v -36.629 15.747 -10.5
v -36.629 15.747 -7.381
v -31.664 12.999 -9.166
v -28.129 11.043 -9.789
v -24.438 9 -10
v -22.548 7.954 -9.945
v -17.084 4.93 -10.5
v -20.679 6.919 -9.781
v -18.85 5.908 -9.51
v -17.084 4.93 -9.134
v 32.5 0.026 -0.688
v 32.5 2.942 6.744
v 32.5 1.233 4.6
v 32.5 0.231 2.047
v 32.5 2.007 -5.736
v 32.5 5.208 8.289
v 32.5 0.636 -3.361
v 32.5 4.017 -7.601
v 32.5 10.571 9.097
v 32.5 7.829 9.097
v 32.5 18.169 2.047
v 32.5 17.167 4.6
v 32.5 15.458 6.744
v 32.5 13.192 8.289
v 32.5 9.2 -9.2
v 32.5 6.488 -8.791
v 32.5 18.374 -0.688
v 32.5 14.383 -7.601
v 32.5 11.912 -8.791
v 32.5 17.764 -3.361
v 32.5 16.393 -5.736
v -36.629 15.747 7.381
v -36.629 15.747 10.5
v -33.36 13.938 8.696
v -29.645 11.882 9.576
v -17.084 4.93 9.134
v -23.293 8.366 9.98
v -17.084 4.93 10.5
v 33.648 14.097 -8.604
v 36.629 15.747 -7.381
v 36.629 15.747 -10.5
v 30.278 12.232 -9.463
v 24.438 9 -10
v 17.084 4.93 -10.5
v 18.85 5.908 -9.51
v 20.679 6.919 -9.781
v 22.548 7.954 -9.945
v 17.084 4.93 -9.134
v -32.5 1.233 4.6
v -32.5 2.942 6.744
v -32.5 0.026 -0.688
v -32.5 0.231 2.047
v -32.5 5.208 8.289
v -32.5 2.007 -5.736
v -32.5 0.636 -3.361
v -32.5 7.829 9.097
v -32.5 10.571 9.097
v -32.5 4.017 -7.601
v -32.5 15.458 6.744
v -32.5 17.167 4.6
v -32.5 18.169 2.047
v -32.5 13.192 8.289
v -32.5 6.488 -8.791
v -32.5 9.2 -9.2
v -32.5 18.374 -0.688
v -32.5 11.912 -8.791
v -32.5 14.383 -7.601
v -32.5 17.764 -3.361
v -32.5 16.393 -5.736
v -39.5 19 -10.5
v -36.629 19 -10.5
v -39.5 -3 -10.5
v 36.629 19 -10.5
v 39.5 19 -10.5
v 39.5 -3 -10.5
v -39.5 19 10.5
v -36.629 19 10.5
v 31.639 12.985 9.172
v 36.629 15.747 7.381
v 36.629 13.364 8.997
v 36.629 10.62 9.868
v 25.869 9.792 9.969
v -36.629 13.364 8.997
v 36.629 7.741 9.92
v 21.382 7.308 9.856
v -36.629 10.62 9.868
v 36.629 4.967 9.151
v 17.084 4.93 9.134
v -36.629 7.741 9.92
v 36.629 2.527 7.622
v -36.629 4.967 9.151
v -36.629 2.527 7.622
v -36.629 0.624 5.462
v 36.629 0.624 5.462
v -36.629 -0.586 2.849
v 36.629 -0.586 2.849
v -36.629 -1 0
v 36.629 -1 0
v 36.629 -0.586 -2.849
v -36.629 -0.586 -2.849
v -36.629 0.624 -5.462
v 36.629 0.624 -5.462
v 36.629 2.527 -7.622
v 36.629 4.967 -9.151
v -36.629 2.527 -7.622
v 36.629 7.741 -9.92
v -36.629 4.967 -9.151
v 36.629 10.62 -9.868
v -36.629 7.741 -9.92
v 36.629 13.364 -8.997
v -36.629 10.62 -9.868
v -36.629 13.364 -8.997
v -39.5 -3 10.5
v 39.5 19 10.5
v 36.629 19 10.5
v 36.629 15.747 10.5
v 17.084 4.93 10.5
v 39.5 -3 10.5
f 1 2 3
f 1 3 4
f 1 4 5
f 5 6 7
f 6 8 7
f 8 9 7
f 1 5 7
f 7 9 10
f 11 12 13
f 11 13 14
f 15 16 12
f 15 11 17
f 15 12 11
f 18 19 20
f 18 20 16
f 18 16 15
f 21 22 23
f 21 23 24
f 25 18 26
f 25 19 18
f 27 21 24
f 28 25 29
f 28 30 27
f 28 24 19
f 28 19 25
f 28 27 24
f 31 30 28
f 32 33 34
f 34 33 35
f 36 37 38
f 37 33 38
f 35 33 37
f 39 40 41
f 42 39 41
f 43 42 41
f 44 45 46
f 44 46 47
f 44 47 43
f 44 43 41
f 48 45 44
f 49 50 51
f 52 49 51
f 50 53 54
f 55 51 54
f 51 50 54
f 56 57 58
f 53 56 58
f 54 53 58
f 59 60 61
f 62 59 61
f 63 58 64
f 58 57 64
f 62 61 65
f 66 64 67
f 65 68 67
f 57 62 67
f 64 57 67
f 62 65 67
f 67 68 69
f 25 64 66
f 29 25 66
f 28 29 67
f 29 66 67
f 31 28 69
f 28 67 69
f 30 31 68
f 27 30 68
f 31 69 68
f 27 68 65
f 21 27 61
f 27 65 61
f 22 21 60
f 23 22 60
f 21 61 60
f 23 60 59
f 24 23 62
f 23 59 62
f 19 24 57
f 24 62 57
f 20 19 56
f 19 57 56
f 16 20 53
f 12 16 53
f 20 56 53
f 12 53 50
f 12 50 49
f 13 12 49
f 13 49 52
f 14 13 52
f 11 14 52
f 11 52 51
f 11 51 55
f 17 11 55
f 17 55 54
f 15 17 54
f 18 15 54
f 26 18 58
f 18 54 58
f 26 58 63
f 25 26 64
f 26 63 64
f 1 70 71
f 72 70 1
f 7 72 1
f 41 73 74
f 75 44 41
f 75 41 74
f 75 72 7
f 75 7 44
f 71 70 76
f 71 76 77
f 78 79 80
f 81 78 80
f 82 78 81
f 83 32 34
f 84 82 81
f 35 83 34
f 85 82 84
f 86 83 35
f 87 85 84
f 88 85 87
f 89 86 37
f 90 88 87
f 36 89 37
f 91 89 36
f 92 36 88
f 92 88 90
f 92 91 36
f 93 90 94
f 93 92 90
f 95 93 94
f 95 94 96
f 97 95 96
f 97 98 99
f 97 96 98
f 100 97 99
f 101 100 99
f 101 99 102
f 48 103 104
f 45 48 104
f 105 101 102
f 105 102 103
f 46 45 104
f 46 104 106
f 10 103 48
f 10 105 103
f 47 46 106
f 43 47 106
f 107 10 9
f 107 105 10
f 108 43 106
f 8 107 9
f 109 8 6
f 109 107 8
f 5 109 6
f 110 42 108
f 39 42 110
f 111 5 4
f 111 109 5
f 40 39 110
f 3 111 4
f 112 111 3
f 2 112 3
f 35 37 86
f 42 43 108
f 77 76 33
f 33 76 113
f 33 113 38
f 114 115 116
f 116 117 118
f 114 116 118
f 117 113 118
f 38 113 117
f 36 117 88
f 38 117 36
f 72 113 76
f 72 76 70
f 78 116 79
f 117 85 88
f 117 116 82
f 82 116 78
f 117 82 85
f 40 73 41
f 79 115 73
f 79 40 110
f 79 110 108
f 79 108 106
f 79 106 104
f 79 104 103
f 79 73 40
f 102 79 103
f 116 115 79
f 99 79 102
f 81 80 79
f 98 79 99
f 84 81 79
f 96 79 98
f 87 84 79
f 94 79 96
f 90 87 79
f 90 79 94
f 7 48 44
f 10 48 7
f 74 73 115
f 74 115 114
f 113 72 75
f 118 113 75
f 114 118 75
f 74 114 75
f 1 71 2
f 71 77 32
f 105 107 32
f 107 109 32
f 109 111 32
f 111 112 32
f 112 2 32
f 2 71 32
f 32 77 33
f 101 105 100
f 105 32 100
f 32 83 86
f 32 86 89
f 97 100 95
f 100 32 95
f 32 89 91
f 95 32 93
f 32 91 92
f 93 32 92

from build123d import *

# Parameters (mm, degrees)
BOSS_EXTRUDE3_DEPTH      = 32.5
BOSS_EXTRUDE3_DEPTH_BACK = 32.5
SKETCH8_R                = 9.2
SKETCH9_W                = 79
SKETCH9_H                = 21
BOSS_EXTRUDE4_DEPTH      = 22
CUT_EXTRUDE1_DEPTH       = 49.602983448
CUT_EXTRUDE2_REACH       = 81.164
SKETCH12_R               = 10


with BuildPart() as part:
    # Sketch8 → Boss-Extrude3 (new, two sides: drawn at the far end of the back side and taken through both)
    with BuildSketch(Plane(origin=(0, 0, 0), x_dir=(0, 0, -1), z_dir=(1, 0, 0)).offset(-BOSS_EXTRUDE3_DEPTH_BACK)):
        with Locations((0, 9.2)):
            Circle(SKETCH8_R)
    extrude(amount=BOSS_EXTRUDE3_DEPTH + BOSS_EXTRUDE3_DEPTH_BACK)


with BuildPart() as body_2:
    # Sketch9 → Boss-Extrude4 (new body)
    with BuildSketch(Plane(origin=(0, -3, 0), x_dir=(1, 0, 0), z_dir=(0, 1, 0))):
        Rectangle(SKETCH9_W, SKETCH9_H)
    extrude(amount=BOSS_EXTRUDE4_DEPTH)

    # Sketch11 → Cut-Extrude1 (cut, through all)
    with BuildSketch(Plane.XY.offset(10.5)):
        Polygon((-36.62898703, 19), (-36.62898703, 15.746848223), (-17.083580509, 4.929733927), (0, 4.929733927), (0, 19), align=None)
    cut_extrude1 = extrude(amount=-CUT_EXTRUDE1_DEPTH, mode=Mode.SUBTRACT)

    # Mirror1: Cut-Extrude1 across plane
    add(cut_extrude1.mirror(Plane(origin=(0, 0, 0), x_dir=(0, 0, 1), z_dir=(1, 0, 0))), mode=Mode.SUBTRACT)

    # Cut-Extrude2: up to this face of the body (flat: up to its plane)
    cut_extrude2_end = Plane(body_2.part.faces().sort_by_distance((36.62898703, 17.373424112, 0))[0])
    # Sketch12 → Cut-Extrude2 (cut, up to the picked face)
    with BuildSketch(Plane(origin=(-36.62898703, 0, 0), x_dir=(0, 0, -1), z_dir=(1, 0, 0)), mode=Mode.PRIVATE) as cut_extrude2_sk1:
        with Locations((0, 9)):
            Circle(SKETCH12_R)
    cut_extrude2_tool1 = split(extrude(cut_extrude2_sk1.sketch, amount=CUT_EXTRUDE2_REACH, mode=Mode.PRIVATE), bisect_by=cut_extrude2_end, keep=Keep.BOTH, mode=Mode.PRIVATE)
    add(cut_extrude2_tool1.solids().sort_by(Axis((-36.628987, 9, 0), (1, 0, 0)))[0], mode=Mode.SUBTRACT)


solid = Compound([part.part, body_2.part])
